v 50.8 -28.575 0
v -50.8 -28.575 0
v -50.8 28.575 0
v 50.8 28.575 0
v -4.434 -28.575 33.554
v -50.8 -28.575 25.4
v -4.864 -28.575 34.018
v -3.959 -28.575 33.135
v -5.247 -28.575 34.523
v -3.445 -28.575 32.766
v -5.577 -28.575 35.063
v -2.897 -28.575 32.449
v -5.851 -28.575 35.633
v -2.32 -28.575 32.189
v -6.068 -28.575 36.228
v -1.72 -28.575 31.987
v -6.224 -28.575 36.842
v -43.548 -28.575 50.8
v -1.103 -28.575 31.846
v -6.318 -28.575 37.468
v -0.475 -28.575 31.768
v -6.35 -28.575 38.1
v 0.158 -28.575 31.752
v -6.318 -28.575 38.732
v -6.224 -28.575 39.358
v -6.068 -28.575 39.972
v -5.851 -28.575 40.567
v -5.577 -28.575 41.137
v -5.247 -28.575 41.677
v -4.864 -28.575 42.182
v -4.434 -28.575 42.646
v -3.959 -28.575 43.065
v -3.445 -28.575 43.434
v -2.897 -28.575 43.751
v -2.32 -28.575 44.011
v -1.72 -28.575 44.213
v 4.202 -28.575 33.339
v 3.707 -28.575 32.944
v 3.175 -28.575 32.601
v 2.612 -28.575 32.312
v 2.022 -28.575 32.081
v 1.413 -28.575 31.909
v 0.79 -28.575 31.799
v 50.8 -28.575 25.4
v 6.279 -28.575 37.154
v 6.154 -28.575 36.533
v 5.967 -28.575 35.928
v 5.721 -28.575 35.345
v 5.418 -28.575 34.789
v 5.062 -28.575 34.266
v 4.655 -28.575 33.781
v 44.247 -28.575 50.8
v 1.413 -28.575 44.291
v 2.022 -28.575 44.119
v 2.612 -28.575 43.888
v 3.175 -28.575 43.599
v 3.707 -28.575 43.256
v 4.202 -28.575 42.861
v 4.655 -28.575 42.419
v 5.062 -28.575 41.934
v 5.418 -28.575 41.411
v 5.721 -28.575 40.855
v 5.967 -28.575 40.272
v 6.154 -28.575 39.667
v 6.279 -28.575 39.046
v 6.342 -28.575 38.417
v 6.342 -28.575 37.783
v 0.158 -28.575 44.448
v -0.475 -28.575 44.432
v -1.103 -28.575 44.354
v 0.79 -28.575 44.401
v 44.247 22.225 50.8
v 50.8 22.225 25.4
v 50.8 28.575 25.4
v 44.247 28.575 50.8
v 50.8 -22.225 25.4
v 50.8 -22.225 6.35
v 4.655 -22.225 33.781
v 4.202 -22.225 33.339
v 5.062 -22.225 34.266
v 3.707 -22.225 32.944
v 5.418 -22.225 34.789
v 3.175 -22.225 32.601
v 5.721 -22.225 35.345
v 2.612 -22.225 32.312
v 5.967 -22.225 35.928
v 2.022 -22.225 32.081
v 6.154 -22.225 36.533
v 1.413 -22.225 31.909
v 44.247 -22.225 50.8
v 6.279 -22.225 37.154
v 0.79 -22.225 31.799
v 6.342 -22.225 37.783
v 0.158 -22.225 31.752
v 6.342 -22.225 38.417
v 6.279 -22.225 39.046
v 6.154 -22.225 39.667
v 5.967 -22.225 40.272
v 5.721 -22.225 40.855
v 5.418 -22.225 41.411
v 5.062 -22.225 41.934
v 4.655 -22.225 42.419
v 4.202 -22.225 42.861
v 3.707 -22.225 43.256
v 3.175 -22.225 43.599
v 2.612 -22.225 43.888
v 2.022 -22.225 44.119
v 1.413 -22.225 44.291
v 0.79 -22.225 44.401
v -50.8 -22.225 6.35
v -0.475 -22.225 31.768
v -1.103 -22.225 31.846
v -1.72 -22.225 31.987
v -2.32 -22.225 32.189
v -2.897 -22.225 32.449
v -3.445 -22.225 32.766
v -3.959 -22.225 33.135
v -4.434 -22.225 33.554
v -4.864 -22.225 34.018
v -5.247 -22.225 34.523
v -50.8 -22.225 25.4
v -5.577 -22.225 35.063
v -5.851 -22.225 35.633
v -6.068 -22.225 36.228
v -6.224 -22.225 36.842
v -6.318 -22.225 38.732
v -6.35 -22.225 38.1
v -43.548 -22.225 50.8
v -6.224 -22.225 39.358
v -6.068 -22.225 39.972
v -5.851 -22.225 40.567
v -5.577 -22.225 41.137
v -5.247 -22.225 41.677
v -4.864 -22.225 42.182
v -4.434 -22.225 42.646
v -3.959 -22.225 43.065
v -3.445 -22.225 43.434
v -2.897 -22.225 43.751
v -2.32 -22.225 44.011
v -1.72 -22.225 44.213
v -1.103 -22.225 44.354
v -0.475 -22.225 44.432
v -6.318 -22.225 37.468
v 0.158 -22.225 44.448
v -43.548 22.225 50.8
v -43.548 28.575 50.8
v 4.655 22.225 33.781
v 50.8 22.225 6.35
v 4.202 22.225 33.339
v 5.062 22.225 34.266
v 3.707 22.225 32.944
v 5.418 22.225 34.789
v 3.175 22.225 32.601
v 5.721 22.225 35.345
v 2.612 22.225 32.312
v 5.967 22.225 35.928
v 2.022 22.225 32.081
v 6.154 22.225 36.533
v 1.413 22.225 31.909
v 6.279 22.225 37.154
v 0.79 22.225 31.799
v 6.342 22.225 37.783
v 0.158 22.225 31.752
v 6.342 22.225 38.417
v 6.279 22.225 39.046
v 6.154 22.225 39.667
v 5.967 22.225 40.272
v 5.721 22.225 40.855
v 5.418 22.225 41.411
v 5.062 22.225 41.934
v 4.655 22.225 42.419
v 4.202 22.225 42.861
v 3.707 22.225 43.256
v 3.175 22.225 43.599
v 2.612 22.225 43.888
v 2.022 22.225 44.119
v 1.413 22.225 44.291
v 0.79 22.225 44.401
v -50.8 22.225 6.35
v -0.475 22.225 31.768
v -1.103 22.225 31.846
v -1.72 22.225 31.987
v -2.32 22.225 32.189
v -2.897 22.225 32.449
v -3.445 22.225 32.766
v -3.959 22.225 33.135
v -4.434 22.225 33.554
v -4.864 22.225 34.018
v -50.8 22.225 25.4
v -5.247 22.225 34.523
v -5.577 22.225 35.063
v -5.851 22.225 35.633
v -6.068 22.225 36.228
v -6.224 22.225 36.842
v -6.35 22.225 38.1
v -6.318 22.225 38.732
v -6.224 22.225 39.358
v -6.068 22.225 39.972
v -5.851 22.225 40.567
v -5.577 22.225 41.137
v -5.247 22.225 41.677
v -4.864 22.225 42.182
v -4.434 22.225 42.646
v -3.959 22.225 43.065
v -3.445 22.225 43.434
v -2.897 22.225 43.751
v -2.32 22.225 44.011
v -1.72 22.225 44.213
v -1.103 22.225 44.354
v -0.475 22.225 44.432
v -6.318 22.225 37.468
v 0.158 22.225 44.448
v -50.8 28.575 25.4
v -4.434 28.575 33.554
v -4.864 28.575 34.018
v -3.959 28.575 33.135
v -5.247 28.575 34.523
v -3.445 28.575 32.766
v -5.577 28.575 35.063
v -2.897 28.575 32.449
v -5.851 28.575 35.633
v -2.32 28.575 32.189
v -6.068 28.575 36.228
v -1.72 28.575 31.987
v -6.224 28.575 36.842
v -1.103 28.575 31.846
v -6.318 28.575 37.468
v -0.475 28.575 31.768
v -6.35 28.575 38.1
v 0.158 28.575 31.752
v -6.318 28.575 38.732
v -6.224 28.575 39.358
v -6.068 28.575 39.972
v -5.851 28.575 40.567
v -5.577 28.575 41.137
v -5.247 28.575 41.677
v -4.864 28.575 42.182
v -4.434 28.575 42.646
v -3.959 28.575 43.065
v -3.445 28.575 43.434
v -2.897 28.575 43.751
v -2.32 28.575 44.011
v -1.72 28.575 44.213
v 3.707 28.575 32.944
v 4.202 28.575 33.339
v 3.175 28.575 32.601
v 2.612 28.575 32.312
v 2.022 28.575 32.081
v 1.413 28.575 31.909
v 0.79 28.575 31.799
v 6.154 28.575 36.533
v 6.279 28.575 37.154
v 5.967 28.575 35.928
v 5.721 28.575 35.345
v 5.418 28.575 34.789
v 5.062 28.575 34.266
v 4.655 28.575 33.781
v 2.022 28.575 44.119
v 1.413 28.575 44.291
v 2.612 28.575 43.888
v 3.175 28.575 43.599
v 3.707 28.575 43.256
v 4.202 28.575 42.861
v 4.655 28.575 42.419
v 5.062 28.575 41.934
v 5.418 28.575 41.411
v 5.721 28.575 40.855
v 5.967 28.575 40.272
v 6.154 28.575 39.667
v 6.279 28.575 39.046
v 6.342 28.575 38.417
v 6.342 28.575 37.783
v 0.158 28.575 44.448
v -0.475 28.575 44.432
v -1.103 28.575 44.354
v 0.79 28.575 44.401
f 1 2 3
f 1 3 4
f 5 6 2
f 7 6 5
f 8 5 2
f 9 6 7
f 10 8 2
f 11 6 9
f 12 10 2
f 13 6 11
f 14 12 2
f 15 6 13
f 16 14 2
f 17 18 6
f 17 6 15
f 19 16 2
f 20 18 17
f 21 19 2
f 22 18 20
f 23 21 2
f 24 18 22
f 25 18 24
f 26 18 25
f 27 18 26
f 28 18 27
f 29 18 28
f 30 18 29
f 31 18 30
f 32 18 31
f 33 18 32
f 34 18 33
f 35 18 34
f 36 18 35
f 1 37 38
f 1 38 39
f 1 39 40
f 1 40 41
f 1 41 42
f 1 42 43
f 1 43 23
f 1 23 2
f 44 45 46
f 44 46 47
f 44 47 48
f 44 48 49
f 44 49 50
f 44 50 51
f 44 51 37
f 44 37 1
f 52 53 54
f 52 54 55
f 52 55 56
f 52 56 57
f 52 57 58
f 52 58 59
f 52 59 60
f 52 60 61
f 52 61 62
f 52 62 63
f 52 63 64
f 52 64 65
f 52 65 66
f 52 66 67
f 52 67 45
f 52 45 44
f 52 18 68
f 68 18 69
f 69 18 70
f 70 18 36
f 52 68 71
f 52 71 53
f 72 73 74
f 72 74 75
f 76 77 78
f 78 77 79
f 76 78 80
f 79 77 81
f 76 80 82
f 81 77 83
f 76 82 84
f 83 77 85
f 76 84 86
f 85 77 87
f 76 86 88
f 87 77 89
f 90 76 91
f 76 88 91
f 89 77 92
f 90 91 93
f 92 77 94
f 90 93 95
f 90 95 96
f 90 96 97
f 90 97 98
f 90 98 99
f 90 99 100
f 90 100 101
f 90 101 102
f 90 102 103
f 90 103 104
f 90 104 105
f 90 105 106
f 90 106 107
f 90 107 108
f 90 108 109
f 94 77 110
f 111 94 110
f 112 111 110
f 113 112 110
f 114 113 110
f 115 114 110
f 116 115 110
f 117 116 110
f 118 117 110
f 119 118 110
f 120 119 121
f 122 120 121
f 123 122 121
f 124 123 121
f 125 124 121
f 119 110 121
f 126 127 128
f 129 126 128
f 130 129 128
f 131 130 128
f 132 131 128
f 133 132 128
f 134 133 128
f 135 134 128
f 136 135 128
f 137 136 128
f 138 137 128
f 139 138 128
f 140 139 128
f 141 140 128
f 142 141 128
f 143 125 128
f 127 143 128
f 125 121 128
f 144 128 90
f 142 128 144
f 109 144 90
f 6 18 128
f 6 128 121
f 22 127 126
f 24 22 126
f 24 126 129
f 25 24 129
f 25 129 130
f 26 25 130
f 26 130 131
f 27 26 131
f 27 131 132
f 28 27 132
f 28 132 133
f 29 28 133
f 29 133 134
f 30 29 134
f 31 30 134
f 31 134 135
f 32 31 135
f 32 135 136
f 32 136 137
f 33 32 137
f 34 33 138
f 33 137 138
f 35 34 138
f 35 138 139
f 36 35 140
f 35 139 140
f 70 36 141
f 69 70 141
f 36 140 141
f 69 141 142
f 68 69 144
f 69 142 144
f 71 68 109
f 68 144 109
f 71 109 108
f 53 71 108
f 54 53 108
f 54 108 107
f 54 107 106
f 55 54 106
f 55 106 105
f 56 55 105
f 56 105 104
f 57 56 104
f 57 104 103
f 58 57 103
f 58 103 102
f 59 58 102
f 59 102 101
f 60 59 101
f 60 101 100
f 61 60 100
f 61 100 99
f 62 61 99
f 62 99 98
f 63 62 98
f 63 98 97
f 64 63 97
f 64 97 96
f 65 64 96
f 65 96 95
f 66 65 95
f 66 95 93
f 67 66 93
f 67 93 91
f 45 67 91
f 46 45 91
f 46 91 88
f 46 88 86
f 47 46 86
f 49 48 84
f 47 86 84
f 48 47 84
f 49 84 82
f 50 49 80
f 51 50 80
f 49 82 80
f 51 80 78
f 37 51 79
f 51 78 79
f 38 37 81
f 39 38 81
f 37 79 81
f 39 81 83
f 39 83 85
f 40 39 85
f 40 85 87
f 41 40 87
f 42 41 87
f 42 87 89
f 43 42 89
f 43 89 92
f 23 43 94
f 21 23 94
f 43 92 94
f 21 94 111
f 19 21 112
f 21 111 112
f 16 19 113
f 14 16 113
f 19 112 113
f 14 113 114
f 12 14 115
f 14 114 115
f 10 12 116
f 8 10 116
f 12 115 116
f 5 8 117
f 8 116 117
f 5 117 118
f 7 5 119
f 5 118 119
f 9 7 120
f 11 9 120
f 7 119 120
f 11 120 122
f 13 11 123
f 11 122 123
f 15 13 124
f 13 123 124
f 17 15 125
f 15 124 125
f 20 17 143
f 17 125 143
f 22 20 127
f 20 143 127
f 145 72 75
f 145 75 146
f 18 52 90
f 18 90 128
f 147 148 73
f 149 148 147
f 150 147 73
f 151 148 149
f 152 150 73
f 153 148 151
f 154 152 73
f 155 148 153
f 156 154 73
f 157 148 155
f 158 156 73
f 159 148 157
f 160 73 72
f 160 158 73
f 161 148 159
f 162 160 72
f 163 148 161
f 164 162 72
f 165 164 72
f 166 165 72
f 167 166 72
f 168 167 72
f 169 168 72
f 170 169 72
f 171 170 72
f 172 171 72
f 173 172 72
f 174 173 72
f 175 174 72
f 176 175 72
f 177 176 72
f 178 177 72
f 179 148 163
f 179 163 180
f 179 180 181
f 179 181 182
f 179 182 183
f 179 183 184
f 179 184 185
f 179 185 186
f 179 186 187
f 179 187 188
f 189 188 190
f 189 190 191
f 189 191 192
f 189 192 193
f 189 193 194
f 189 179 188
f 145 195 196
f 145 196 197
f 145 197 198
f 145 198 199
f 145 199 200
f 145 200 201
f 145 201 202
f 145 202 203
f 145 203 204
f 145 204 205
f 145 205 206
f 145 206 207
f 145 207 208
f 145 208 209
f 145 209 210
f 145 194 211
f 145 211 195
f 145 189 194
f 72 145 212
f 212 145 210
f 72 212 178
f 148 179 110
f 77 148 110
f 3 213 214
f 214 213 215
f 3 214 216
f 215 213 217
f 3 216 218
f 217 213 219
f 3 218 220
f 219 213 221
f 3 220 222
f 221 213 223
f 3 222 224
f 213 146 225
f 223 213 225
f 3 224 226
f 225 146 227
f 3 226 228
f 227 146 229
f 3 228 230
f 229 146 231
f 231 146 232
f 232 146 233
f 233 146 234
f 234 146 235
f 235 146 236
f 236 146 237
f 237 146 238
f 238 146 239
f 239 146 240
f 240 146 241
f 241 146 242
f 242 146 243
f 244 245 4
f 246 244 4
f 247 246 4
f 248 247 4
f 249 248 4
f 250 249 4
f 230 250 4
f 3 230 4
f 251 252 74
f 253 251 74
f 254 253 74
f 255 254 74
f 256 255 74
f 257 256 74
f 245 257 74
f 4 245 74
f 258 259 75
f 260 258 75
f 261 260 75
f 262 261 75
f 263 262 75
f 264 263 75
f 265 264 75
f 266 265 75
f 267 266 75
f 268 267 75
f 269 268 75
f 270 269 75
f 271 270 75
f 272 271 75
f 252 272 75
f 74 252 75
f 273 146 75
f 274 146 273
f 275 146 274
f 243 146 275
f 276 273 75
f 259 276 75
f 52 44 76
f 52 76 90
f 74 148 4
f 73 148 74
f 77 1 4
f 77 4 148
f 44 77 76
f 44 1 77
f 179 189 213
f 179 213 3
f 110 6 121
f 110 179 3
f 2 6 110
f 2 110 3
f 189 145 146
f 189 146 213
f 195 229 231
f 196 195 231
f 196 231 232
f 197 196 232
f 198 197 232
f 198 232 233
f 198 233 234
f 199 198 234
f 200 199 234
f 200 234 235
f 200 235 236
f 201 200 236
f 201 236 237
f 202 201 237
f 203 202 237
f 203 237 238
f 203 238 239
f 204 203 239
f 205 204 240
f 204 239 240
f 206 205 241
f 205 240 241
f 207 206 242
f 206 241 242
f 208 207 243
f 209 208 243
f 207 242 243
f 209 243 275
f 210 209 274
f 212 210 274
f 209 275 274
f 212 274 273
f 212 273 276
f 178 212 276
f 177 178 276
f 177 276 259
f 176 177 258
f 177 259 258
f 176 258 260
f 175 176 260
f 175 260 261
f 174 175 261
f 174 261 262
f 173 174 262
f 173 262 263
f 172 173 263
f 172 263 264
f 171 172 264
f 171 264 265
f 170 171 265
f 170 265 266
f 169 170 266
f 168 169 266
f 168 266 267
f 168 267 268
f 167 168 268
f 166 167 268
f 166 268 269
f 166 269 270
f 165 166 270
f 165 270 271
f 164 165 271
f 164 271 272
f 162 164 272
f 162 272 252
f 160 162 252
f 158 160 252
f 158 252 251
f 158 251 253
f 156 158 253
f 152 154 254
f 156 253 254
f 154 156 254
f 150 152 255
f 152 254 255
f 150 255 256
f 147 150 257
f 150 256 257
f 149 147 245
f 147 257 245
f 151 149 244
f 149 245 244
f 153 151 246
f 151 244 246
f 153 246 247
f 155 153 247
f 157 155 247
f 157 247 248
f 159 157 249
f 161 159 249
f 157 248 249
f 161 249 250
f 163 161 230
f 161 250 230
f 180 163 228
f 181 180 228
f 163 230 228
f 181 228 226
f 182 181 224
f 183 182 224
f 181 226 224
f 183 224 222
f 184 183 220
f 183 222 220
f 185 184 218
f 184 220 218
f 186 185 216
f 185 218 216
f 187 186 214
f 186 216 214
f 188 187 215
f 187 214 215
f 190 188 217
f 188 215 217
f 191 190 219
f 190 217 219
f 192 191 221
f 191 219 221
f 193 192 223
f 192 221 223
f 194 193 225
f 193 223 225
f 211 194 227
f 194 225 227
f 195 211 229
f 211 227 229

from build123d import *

# Parameters (mm, degrees)
F1_DEPTH = 28.575
F2_W     = 44.45
F2_H     = 44.45
F3_DEPTH = 127
F4_R     = 6.35
F5_DEPTH = 57.151


with BuildPart() as f1:
    # F0 (on Front) → F1 (new body, symmetric)
    with BuildSketch(Plane.XZ):
        Polygon((-50.8, 25.4), (-50.8, 0), (50.8, 0), (50.8, 25.4), (44.247393, 50.8), (-43.547828, 50.8), align=None)
    extrude(amount=F1_DEPTH, both=True)

    # F2 (on face) → F3 (cut)
    with BuildSketch(Plane(origin=(-50.8, 0, 0), x_dir=(0, -1, 0), z_dir=(-1, 0, 0))):
        with Locations((0, 28.575)):
            Rectangle(F2_W, F2_H)
    extrude(amount=-F3_DEPTH, mode=Mode.SUBTRACT)

    # F4 (on face) → F5 (cut, through all)
    with BuildSketch(Plane(origin=(0, 28.575, 0), x_dir=(-1, 0, 0), z_dir=(0, 1, 0))):
        with Locations((0, 38.1)):
            Circle(F4_R)
    extrude(amount=-F5_DEPTH, mode=Mode.SUBTRACT)


solid = f1.part
